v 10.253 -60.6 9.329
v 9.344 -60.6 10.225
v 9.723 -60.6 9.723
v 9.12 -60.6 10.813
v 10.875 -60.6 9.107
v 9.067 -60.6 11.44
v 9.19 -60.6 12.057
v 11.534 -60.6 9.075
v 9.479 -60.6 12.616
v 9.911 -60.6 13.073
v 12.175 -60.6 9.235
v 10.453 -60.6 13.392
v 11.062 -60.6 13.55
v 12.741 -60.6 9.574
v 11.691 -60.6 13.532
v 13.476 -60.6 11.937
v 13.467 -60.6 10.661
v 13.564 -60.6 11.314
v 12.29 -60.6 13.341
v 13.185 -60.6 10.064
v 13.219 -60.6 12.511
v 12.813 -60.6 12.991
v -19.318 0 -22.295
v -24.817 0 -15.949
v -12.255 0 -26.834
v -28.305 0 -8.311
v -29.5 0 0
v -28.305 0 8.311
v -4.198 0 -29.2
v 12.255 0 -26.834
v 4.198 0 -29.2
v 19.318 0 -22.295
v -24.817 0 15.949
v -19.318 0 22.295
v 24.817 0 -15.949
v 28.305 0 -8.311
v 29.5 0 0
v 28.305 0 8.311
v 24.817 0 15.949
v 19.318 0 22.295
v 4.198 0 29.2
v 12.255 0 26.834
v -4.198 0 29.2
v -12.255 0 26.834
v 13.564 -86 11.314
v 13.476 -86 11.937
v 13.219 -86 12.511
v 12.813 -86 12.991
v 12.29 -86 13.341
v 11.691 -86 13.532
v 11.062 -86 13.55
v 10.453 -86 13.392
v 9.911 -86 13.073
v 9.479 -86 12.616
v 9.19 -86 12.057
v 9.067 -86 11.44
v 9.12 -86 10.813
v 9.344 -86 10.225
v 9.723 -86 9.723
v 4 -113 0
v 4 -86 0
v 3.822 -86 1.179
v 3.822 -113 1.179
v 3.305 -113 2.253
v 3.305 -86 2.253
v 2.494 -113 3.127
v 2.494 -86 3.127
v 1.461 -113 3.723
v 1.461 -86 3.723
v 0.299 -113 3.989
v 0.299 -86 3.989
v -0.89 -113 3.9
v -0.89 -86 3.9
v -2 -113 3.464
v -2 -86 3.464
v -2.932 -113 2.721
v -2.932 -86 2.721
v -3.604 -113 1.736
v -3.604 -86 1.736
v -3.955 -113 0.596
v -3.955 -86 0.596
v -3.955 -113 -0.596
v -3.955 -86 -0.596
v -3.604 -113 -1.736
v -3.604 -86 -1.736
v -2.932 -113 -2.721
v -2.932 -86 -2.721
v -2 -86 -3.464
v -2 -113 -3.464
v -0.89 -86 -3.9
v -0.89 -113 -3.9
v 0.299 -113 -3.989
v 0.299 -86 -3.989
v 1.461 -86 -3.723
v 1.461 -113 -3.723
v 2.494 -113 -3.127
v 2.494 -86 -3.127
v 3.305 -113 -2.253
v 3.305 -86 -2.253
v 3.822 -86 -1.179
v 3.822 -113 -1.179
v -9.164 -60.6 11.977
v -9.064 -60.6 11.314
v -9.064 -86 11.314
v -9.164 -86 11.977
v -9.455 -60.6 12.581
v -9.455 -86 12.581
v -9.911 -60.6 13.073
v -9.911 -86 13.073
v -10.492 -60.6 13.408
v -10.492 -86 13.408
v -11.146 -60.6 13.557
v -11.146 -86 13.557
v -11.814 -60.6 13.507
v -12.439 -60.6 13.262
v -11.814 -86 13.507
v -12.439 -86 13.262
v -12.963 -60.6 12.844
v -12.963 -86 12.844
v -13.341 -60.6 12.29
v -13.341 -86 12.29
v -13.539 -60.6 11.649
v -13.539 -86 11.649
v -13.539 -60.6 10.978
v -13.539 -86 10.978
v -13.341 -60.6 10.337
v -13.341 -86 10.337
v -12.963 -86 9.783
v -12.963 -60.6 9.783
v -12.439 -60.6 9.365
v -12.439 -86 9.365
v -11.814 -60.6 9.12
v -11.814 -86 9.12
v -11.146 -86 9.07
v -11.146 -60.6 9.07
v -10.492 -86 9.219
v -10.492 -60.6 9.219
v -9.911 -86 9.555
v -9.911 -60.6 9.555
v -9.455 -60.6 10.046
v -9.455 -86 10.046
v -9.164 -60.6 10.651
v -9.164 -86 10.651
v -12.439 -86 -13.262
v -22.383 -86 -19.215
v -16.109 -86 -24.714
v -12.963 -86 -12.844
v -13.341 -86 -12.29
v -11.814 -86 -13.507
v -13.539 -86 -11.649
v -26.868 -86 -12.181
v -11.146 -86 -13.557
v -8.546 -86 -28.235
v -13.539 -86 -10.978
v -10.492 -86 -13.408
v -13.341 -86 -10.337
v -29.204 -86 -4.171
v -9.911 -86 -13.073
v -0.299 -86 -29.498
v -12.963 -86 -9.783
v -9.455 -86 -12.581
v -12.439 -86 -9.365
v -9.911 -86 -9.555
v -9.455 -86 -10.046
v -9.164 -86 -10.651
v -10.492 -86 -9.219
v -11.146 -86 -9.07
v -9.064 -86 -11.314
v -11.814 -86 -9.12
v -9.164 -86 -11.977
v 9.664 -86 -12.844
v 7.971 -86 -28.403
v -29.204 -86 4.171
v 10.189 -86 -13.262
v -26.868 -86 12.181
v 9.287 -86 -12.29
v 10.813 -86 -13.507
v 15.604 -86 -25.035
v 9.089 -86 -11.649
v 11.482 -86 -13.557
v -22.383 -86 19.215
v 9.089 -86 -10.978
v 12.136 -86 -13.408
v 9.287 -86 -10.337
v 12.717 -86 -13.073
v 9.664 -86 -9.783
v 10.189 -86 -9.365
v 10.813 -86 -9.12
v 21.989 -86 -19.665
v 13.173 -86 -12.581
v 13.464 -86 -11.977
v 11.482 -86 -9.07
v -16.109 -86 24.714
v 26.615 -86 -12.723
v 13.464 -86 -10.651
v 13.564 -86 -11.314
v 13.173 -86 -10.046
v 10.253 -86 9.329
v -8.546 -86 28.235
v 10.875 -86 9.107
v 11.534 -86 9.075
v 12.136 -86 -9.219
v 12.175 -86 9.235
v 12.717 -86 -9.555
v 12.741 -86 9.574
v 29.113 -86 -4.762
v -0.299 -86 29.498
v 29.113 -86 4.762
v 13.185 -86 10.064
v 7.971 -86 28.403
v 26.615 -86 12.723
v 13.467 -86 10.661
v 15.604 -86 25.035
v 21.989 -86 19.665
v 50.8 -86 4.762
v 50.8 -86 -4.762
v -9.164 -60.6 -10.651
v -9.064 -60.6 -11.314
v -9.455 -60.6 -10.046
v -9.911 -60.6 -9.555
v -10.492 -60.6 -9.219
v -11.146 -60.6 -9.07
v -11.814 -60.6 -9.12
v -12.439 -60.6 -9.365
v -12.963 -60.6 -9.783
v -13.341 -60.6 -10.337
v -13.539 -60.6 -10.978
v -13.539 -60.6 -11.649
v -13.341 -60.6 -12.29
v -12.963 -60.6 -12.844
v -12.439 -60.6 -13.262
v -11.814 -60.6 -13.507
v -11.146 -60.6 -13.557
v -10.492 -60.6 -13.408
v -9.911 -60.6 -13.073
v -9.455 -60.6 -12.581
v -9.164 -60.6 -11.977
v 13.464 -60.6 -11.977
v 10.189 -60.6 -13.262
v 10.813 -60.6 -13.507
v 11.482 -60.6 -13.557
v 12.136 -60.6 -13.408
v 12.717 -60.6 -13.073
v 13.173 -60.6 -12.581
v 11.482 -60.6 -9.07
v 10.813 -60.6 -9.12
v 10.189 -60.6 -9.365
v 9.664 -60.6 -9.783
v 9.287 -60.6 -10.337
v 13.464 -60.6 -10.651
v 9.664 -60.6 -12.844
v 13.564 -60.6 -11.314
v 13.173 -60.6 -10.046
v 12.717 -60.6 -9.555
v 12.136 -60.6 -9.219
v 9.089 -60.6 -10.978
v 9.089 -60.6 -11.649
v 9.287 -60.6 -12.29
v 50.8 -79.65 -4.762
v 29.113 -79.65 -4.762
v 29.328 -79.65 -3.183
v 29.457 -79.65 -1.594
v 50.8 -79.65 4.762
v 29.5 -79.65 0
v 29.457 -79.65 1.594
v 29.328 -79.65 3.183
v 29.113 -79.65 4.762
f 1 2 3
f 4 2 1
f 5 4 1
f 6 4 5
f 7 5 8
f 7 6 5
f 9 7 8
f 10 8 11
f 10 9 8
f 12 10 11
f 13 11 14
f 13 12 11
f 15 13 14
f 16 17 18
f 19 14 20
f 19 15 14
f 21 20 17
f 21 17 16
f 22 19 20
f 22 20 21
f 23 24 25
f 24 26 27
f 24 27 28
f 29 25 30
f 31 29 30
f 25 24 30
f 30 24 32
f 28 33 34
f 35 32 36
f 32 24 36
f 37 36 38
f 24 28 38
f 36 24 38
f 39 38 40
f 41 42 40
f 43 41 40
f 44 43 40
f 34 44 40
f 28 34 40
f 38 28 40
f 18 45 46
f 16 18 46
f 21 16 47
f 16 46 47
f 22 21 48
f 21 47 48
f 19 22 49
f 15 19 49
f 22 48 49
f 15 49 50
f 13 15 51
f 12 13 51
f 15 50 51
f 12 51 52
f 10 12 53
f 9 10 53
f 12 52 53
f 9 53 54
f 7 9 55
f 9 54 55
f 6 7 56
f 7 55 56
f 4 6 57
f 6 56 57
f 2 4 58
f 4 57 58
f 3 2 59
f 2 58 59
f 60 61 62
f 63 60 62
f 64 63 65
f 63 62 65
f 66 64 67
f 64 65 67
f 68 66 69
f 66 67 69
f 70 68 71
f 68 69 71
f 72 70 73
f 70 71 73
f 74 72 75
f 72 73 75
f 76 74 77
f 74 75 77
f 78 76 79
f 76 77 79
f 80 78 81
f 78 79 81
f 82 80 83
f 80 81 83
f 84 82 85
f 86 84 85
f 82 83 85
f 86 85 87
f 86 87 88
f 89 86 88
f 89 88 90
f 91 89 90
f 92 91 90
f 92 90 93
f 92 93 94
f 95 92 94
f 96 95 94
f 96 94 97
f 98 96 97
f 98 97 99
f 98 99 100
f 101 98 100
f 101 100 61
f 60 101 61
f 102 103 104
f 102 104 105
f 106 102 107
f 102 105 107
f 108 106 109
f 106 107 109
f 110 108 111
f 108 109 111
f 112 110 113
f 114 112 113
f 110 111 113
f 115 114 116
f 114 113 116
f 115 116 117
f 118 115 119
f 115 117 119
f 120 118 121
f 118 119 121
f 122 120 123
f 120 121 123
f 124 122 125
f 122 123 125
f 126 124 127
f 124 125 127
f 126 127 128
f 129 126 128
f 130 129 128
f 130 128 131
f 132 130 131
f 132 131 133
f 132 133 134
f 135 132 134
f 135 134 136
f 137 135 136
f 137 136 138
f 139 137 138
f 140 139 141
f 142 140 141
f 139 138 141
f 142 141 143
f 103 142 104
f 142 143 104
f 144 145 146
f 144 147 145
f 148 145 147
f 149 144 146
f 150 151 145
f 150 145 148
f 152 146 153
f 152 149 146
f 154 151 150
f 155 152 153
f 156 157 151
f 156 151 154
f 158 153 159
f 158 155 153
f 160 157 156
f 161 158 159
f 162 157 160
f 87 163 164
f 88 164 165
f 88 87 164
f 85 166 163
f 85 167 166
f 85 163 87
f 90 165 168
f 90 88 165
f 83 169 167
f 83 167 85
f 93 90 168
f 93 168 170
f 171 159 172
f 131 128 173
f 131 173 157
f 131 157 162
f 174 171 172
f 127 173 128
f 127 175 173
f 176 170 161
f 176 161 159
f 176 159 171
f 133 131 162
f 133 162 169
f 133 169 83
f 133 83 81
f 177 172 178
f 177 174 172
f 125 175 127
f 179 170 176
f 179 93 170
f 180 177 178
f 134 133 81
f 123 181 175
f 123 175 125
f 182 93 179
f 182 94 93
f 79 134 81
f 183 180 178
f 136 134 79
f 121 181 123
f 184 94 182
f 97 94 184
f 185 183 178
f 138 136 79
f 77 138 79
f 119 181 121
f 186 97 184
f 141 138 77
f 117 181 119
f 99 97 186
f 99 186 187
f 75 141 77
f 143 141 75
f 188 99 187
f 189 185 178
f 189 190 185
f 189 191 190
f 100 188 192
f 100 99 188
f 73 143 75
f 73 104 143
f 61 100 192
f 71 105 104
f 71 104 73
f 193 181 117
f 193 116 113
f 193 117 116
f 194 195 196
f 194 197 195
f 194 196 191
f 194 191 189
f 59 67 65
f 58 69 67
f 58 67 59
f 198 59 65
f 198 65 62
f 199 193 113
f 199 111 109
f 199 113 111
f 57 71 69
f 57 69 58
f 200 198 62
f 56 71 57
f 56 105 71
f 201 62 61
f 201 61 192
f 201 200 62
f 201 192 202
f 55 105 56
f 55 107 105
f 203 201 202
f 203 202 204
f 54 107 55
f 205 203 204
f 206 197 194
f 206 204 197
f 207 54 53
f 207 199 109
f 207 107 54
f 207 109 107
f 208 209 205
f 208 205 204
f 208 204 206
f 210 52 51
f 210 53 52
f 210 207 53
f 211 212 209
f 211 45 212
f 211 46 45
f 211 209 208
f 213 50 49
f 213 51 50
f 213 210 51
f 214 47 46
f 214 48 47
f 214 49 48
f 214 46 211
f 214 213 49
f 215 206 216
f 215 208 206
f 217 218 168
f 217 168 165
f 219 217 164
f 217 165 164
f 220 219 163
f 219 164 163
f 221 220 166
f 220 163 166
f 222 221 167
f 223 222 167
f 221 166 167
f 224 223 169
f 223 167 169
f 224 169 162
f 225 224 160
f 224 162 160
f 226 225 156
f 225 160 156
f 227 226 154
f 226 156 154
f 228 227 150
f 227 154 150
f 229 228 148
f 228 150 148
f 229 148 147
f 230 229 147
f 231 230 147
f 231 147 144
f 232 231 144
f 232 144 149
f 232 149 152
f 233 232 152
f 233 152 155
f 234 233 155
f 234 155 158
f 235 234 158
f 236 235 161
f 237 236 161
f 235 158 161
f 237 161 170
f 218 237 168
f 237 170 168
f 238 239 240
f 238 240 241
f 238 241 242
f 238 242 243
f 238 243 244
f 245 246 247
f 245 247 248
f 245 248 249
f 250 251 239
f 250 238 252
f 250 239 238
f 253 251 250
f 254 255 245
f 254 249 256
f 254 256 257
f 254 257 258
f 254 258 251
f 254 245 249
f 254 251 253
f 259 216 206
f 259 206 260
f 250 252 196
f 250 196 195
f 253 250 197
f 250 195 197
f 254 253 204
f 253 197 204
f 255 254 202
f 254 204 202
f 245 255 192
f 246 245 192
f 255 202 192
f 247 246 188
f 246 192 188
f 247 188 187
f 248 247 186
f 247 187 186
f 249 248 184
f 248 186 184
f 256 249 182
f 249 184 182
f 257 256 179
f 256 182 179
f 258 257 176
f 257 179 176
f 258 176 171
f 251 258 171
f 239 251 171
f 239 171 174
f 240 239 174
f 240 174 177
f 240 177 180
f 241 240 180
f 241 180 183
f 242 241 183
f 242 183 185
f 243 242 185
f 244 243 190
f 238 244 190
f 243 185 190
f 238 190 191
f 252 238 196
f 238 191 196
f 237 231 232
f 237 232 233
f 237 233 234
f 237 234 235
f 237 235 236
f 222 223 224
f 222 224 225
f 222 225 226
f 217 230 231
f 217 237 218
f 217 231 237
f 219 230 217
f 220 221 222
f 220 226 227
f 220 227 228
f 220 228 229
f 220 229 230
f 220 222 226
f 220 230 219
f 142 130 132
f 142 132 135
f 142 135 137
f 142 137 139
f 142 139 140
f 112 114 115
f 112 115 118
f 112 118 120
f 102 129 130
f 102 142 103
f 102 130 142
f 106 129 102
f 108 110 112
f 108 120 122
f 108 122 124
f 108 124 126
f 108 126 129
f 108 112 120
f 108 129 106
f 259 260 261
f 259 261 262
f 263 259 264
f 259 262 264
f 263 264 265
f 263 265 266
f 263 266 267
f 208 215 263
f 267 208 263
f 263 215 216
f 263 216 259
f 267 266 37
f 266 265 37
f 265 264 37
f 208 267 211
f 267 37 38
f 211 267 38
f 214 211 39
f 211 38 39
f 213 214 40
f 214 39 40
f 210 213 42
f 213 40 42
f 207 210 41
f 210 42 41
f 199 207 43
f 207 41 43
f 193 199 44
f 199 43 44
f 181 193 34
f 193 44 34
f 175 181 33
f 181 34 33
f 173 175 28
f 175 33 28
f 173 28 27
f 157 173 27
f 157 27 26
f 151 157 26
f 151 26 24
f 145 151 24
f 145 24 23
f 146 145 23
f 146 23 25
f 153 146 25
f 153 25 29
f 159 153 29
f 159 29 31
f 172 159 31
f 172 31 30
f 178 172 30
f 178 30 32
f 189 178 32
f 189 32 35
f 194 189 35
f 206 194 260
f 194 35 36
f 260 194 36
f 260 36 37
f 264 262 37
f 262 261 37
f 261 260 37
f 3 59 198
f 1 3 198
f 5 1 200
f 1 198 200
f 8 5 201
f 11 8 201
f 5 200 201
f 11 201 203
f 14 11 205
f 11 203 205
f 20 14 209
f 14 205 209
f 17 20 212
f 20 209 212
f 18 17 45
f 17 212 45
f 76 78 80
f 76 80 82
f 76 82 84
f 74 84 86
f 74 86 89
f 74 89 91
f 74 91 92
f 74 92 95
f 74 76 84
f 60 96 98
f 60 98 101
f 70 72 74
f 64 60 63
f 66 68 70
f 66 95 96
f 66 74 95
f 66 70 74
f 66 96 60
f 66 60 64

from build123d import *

# Parameters (mm, degrees)
F0_R     = 29.5
F1_DEPTH = 86
F2_R     = 4
F3_DEPTH = 27
F5_W     = 6.35
F5_H     = 9.525
F6_DEPTH = 50.8
F4_R     = 2.25
F7_DEPTH = 25.4


with BuildPart() as f1:
    # F0 (on Front) → F1 (new body)
    with BuildSketch(Plane.XZ):
        Circle(F0_R)
    extrude(amount=F1_DEPTH)

    # F2 (on face) → F3 (join)
    with BuildSketch(Plane.XZ.offset(86)):
        Circle(F2_R)
    extrude(amount=F3_DEPTH)

    # F5 (on Right) → F6 (join)
    with BuildSketch(Plane.YZ):
        with Locations((-82.825, 0)):
            Rectangle(F5_W, F5_H)
    extrude(amount=F6_DEPTH)

    # F4 (on face) → F7 (cut)
    with BuildSketch(Plane.XZ.offset(86)):
        with BuildLine():
            ThreePointArc((9.722718, 9.722718), (12.174746, 9.23498), (13.563708, 11.313708))
            ThreePointArc((13.563708, 11.313708), (10.452671, 13.392437), (9.722718, 9.722718))
        make_face()
        with Locations((-11.313708, 11.313708)):
            Circle(F4_R)
        with Locations((-11.313708, -11.313708)):
            Circle(F4_R)
        with Locations((11.313708, -11.313708)):
            Circle(F4_R)
    extrude(amount=-F7_DEPTH, mode=Mode.SUBTRACT)


solid = f1.part
